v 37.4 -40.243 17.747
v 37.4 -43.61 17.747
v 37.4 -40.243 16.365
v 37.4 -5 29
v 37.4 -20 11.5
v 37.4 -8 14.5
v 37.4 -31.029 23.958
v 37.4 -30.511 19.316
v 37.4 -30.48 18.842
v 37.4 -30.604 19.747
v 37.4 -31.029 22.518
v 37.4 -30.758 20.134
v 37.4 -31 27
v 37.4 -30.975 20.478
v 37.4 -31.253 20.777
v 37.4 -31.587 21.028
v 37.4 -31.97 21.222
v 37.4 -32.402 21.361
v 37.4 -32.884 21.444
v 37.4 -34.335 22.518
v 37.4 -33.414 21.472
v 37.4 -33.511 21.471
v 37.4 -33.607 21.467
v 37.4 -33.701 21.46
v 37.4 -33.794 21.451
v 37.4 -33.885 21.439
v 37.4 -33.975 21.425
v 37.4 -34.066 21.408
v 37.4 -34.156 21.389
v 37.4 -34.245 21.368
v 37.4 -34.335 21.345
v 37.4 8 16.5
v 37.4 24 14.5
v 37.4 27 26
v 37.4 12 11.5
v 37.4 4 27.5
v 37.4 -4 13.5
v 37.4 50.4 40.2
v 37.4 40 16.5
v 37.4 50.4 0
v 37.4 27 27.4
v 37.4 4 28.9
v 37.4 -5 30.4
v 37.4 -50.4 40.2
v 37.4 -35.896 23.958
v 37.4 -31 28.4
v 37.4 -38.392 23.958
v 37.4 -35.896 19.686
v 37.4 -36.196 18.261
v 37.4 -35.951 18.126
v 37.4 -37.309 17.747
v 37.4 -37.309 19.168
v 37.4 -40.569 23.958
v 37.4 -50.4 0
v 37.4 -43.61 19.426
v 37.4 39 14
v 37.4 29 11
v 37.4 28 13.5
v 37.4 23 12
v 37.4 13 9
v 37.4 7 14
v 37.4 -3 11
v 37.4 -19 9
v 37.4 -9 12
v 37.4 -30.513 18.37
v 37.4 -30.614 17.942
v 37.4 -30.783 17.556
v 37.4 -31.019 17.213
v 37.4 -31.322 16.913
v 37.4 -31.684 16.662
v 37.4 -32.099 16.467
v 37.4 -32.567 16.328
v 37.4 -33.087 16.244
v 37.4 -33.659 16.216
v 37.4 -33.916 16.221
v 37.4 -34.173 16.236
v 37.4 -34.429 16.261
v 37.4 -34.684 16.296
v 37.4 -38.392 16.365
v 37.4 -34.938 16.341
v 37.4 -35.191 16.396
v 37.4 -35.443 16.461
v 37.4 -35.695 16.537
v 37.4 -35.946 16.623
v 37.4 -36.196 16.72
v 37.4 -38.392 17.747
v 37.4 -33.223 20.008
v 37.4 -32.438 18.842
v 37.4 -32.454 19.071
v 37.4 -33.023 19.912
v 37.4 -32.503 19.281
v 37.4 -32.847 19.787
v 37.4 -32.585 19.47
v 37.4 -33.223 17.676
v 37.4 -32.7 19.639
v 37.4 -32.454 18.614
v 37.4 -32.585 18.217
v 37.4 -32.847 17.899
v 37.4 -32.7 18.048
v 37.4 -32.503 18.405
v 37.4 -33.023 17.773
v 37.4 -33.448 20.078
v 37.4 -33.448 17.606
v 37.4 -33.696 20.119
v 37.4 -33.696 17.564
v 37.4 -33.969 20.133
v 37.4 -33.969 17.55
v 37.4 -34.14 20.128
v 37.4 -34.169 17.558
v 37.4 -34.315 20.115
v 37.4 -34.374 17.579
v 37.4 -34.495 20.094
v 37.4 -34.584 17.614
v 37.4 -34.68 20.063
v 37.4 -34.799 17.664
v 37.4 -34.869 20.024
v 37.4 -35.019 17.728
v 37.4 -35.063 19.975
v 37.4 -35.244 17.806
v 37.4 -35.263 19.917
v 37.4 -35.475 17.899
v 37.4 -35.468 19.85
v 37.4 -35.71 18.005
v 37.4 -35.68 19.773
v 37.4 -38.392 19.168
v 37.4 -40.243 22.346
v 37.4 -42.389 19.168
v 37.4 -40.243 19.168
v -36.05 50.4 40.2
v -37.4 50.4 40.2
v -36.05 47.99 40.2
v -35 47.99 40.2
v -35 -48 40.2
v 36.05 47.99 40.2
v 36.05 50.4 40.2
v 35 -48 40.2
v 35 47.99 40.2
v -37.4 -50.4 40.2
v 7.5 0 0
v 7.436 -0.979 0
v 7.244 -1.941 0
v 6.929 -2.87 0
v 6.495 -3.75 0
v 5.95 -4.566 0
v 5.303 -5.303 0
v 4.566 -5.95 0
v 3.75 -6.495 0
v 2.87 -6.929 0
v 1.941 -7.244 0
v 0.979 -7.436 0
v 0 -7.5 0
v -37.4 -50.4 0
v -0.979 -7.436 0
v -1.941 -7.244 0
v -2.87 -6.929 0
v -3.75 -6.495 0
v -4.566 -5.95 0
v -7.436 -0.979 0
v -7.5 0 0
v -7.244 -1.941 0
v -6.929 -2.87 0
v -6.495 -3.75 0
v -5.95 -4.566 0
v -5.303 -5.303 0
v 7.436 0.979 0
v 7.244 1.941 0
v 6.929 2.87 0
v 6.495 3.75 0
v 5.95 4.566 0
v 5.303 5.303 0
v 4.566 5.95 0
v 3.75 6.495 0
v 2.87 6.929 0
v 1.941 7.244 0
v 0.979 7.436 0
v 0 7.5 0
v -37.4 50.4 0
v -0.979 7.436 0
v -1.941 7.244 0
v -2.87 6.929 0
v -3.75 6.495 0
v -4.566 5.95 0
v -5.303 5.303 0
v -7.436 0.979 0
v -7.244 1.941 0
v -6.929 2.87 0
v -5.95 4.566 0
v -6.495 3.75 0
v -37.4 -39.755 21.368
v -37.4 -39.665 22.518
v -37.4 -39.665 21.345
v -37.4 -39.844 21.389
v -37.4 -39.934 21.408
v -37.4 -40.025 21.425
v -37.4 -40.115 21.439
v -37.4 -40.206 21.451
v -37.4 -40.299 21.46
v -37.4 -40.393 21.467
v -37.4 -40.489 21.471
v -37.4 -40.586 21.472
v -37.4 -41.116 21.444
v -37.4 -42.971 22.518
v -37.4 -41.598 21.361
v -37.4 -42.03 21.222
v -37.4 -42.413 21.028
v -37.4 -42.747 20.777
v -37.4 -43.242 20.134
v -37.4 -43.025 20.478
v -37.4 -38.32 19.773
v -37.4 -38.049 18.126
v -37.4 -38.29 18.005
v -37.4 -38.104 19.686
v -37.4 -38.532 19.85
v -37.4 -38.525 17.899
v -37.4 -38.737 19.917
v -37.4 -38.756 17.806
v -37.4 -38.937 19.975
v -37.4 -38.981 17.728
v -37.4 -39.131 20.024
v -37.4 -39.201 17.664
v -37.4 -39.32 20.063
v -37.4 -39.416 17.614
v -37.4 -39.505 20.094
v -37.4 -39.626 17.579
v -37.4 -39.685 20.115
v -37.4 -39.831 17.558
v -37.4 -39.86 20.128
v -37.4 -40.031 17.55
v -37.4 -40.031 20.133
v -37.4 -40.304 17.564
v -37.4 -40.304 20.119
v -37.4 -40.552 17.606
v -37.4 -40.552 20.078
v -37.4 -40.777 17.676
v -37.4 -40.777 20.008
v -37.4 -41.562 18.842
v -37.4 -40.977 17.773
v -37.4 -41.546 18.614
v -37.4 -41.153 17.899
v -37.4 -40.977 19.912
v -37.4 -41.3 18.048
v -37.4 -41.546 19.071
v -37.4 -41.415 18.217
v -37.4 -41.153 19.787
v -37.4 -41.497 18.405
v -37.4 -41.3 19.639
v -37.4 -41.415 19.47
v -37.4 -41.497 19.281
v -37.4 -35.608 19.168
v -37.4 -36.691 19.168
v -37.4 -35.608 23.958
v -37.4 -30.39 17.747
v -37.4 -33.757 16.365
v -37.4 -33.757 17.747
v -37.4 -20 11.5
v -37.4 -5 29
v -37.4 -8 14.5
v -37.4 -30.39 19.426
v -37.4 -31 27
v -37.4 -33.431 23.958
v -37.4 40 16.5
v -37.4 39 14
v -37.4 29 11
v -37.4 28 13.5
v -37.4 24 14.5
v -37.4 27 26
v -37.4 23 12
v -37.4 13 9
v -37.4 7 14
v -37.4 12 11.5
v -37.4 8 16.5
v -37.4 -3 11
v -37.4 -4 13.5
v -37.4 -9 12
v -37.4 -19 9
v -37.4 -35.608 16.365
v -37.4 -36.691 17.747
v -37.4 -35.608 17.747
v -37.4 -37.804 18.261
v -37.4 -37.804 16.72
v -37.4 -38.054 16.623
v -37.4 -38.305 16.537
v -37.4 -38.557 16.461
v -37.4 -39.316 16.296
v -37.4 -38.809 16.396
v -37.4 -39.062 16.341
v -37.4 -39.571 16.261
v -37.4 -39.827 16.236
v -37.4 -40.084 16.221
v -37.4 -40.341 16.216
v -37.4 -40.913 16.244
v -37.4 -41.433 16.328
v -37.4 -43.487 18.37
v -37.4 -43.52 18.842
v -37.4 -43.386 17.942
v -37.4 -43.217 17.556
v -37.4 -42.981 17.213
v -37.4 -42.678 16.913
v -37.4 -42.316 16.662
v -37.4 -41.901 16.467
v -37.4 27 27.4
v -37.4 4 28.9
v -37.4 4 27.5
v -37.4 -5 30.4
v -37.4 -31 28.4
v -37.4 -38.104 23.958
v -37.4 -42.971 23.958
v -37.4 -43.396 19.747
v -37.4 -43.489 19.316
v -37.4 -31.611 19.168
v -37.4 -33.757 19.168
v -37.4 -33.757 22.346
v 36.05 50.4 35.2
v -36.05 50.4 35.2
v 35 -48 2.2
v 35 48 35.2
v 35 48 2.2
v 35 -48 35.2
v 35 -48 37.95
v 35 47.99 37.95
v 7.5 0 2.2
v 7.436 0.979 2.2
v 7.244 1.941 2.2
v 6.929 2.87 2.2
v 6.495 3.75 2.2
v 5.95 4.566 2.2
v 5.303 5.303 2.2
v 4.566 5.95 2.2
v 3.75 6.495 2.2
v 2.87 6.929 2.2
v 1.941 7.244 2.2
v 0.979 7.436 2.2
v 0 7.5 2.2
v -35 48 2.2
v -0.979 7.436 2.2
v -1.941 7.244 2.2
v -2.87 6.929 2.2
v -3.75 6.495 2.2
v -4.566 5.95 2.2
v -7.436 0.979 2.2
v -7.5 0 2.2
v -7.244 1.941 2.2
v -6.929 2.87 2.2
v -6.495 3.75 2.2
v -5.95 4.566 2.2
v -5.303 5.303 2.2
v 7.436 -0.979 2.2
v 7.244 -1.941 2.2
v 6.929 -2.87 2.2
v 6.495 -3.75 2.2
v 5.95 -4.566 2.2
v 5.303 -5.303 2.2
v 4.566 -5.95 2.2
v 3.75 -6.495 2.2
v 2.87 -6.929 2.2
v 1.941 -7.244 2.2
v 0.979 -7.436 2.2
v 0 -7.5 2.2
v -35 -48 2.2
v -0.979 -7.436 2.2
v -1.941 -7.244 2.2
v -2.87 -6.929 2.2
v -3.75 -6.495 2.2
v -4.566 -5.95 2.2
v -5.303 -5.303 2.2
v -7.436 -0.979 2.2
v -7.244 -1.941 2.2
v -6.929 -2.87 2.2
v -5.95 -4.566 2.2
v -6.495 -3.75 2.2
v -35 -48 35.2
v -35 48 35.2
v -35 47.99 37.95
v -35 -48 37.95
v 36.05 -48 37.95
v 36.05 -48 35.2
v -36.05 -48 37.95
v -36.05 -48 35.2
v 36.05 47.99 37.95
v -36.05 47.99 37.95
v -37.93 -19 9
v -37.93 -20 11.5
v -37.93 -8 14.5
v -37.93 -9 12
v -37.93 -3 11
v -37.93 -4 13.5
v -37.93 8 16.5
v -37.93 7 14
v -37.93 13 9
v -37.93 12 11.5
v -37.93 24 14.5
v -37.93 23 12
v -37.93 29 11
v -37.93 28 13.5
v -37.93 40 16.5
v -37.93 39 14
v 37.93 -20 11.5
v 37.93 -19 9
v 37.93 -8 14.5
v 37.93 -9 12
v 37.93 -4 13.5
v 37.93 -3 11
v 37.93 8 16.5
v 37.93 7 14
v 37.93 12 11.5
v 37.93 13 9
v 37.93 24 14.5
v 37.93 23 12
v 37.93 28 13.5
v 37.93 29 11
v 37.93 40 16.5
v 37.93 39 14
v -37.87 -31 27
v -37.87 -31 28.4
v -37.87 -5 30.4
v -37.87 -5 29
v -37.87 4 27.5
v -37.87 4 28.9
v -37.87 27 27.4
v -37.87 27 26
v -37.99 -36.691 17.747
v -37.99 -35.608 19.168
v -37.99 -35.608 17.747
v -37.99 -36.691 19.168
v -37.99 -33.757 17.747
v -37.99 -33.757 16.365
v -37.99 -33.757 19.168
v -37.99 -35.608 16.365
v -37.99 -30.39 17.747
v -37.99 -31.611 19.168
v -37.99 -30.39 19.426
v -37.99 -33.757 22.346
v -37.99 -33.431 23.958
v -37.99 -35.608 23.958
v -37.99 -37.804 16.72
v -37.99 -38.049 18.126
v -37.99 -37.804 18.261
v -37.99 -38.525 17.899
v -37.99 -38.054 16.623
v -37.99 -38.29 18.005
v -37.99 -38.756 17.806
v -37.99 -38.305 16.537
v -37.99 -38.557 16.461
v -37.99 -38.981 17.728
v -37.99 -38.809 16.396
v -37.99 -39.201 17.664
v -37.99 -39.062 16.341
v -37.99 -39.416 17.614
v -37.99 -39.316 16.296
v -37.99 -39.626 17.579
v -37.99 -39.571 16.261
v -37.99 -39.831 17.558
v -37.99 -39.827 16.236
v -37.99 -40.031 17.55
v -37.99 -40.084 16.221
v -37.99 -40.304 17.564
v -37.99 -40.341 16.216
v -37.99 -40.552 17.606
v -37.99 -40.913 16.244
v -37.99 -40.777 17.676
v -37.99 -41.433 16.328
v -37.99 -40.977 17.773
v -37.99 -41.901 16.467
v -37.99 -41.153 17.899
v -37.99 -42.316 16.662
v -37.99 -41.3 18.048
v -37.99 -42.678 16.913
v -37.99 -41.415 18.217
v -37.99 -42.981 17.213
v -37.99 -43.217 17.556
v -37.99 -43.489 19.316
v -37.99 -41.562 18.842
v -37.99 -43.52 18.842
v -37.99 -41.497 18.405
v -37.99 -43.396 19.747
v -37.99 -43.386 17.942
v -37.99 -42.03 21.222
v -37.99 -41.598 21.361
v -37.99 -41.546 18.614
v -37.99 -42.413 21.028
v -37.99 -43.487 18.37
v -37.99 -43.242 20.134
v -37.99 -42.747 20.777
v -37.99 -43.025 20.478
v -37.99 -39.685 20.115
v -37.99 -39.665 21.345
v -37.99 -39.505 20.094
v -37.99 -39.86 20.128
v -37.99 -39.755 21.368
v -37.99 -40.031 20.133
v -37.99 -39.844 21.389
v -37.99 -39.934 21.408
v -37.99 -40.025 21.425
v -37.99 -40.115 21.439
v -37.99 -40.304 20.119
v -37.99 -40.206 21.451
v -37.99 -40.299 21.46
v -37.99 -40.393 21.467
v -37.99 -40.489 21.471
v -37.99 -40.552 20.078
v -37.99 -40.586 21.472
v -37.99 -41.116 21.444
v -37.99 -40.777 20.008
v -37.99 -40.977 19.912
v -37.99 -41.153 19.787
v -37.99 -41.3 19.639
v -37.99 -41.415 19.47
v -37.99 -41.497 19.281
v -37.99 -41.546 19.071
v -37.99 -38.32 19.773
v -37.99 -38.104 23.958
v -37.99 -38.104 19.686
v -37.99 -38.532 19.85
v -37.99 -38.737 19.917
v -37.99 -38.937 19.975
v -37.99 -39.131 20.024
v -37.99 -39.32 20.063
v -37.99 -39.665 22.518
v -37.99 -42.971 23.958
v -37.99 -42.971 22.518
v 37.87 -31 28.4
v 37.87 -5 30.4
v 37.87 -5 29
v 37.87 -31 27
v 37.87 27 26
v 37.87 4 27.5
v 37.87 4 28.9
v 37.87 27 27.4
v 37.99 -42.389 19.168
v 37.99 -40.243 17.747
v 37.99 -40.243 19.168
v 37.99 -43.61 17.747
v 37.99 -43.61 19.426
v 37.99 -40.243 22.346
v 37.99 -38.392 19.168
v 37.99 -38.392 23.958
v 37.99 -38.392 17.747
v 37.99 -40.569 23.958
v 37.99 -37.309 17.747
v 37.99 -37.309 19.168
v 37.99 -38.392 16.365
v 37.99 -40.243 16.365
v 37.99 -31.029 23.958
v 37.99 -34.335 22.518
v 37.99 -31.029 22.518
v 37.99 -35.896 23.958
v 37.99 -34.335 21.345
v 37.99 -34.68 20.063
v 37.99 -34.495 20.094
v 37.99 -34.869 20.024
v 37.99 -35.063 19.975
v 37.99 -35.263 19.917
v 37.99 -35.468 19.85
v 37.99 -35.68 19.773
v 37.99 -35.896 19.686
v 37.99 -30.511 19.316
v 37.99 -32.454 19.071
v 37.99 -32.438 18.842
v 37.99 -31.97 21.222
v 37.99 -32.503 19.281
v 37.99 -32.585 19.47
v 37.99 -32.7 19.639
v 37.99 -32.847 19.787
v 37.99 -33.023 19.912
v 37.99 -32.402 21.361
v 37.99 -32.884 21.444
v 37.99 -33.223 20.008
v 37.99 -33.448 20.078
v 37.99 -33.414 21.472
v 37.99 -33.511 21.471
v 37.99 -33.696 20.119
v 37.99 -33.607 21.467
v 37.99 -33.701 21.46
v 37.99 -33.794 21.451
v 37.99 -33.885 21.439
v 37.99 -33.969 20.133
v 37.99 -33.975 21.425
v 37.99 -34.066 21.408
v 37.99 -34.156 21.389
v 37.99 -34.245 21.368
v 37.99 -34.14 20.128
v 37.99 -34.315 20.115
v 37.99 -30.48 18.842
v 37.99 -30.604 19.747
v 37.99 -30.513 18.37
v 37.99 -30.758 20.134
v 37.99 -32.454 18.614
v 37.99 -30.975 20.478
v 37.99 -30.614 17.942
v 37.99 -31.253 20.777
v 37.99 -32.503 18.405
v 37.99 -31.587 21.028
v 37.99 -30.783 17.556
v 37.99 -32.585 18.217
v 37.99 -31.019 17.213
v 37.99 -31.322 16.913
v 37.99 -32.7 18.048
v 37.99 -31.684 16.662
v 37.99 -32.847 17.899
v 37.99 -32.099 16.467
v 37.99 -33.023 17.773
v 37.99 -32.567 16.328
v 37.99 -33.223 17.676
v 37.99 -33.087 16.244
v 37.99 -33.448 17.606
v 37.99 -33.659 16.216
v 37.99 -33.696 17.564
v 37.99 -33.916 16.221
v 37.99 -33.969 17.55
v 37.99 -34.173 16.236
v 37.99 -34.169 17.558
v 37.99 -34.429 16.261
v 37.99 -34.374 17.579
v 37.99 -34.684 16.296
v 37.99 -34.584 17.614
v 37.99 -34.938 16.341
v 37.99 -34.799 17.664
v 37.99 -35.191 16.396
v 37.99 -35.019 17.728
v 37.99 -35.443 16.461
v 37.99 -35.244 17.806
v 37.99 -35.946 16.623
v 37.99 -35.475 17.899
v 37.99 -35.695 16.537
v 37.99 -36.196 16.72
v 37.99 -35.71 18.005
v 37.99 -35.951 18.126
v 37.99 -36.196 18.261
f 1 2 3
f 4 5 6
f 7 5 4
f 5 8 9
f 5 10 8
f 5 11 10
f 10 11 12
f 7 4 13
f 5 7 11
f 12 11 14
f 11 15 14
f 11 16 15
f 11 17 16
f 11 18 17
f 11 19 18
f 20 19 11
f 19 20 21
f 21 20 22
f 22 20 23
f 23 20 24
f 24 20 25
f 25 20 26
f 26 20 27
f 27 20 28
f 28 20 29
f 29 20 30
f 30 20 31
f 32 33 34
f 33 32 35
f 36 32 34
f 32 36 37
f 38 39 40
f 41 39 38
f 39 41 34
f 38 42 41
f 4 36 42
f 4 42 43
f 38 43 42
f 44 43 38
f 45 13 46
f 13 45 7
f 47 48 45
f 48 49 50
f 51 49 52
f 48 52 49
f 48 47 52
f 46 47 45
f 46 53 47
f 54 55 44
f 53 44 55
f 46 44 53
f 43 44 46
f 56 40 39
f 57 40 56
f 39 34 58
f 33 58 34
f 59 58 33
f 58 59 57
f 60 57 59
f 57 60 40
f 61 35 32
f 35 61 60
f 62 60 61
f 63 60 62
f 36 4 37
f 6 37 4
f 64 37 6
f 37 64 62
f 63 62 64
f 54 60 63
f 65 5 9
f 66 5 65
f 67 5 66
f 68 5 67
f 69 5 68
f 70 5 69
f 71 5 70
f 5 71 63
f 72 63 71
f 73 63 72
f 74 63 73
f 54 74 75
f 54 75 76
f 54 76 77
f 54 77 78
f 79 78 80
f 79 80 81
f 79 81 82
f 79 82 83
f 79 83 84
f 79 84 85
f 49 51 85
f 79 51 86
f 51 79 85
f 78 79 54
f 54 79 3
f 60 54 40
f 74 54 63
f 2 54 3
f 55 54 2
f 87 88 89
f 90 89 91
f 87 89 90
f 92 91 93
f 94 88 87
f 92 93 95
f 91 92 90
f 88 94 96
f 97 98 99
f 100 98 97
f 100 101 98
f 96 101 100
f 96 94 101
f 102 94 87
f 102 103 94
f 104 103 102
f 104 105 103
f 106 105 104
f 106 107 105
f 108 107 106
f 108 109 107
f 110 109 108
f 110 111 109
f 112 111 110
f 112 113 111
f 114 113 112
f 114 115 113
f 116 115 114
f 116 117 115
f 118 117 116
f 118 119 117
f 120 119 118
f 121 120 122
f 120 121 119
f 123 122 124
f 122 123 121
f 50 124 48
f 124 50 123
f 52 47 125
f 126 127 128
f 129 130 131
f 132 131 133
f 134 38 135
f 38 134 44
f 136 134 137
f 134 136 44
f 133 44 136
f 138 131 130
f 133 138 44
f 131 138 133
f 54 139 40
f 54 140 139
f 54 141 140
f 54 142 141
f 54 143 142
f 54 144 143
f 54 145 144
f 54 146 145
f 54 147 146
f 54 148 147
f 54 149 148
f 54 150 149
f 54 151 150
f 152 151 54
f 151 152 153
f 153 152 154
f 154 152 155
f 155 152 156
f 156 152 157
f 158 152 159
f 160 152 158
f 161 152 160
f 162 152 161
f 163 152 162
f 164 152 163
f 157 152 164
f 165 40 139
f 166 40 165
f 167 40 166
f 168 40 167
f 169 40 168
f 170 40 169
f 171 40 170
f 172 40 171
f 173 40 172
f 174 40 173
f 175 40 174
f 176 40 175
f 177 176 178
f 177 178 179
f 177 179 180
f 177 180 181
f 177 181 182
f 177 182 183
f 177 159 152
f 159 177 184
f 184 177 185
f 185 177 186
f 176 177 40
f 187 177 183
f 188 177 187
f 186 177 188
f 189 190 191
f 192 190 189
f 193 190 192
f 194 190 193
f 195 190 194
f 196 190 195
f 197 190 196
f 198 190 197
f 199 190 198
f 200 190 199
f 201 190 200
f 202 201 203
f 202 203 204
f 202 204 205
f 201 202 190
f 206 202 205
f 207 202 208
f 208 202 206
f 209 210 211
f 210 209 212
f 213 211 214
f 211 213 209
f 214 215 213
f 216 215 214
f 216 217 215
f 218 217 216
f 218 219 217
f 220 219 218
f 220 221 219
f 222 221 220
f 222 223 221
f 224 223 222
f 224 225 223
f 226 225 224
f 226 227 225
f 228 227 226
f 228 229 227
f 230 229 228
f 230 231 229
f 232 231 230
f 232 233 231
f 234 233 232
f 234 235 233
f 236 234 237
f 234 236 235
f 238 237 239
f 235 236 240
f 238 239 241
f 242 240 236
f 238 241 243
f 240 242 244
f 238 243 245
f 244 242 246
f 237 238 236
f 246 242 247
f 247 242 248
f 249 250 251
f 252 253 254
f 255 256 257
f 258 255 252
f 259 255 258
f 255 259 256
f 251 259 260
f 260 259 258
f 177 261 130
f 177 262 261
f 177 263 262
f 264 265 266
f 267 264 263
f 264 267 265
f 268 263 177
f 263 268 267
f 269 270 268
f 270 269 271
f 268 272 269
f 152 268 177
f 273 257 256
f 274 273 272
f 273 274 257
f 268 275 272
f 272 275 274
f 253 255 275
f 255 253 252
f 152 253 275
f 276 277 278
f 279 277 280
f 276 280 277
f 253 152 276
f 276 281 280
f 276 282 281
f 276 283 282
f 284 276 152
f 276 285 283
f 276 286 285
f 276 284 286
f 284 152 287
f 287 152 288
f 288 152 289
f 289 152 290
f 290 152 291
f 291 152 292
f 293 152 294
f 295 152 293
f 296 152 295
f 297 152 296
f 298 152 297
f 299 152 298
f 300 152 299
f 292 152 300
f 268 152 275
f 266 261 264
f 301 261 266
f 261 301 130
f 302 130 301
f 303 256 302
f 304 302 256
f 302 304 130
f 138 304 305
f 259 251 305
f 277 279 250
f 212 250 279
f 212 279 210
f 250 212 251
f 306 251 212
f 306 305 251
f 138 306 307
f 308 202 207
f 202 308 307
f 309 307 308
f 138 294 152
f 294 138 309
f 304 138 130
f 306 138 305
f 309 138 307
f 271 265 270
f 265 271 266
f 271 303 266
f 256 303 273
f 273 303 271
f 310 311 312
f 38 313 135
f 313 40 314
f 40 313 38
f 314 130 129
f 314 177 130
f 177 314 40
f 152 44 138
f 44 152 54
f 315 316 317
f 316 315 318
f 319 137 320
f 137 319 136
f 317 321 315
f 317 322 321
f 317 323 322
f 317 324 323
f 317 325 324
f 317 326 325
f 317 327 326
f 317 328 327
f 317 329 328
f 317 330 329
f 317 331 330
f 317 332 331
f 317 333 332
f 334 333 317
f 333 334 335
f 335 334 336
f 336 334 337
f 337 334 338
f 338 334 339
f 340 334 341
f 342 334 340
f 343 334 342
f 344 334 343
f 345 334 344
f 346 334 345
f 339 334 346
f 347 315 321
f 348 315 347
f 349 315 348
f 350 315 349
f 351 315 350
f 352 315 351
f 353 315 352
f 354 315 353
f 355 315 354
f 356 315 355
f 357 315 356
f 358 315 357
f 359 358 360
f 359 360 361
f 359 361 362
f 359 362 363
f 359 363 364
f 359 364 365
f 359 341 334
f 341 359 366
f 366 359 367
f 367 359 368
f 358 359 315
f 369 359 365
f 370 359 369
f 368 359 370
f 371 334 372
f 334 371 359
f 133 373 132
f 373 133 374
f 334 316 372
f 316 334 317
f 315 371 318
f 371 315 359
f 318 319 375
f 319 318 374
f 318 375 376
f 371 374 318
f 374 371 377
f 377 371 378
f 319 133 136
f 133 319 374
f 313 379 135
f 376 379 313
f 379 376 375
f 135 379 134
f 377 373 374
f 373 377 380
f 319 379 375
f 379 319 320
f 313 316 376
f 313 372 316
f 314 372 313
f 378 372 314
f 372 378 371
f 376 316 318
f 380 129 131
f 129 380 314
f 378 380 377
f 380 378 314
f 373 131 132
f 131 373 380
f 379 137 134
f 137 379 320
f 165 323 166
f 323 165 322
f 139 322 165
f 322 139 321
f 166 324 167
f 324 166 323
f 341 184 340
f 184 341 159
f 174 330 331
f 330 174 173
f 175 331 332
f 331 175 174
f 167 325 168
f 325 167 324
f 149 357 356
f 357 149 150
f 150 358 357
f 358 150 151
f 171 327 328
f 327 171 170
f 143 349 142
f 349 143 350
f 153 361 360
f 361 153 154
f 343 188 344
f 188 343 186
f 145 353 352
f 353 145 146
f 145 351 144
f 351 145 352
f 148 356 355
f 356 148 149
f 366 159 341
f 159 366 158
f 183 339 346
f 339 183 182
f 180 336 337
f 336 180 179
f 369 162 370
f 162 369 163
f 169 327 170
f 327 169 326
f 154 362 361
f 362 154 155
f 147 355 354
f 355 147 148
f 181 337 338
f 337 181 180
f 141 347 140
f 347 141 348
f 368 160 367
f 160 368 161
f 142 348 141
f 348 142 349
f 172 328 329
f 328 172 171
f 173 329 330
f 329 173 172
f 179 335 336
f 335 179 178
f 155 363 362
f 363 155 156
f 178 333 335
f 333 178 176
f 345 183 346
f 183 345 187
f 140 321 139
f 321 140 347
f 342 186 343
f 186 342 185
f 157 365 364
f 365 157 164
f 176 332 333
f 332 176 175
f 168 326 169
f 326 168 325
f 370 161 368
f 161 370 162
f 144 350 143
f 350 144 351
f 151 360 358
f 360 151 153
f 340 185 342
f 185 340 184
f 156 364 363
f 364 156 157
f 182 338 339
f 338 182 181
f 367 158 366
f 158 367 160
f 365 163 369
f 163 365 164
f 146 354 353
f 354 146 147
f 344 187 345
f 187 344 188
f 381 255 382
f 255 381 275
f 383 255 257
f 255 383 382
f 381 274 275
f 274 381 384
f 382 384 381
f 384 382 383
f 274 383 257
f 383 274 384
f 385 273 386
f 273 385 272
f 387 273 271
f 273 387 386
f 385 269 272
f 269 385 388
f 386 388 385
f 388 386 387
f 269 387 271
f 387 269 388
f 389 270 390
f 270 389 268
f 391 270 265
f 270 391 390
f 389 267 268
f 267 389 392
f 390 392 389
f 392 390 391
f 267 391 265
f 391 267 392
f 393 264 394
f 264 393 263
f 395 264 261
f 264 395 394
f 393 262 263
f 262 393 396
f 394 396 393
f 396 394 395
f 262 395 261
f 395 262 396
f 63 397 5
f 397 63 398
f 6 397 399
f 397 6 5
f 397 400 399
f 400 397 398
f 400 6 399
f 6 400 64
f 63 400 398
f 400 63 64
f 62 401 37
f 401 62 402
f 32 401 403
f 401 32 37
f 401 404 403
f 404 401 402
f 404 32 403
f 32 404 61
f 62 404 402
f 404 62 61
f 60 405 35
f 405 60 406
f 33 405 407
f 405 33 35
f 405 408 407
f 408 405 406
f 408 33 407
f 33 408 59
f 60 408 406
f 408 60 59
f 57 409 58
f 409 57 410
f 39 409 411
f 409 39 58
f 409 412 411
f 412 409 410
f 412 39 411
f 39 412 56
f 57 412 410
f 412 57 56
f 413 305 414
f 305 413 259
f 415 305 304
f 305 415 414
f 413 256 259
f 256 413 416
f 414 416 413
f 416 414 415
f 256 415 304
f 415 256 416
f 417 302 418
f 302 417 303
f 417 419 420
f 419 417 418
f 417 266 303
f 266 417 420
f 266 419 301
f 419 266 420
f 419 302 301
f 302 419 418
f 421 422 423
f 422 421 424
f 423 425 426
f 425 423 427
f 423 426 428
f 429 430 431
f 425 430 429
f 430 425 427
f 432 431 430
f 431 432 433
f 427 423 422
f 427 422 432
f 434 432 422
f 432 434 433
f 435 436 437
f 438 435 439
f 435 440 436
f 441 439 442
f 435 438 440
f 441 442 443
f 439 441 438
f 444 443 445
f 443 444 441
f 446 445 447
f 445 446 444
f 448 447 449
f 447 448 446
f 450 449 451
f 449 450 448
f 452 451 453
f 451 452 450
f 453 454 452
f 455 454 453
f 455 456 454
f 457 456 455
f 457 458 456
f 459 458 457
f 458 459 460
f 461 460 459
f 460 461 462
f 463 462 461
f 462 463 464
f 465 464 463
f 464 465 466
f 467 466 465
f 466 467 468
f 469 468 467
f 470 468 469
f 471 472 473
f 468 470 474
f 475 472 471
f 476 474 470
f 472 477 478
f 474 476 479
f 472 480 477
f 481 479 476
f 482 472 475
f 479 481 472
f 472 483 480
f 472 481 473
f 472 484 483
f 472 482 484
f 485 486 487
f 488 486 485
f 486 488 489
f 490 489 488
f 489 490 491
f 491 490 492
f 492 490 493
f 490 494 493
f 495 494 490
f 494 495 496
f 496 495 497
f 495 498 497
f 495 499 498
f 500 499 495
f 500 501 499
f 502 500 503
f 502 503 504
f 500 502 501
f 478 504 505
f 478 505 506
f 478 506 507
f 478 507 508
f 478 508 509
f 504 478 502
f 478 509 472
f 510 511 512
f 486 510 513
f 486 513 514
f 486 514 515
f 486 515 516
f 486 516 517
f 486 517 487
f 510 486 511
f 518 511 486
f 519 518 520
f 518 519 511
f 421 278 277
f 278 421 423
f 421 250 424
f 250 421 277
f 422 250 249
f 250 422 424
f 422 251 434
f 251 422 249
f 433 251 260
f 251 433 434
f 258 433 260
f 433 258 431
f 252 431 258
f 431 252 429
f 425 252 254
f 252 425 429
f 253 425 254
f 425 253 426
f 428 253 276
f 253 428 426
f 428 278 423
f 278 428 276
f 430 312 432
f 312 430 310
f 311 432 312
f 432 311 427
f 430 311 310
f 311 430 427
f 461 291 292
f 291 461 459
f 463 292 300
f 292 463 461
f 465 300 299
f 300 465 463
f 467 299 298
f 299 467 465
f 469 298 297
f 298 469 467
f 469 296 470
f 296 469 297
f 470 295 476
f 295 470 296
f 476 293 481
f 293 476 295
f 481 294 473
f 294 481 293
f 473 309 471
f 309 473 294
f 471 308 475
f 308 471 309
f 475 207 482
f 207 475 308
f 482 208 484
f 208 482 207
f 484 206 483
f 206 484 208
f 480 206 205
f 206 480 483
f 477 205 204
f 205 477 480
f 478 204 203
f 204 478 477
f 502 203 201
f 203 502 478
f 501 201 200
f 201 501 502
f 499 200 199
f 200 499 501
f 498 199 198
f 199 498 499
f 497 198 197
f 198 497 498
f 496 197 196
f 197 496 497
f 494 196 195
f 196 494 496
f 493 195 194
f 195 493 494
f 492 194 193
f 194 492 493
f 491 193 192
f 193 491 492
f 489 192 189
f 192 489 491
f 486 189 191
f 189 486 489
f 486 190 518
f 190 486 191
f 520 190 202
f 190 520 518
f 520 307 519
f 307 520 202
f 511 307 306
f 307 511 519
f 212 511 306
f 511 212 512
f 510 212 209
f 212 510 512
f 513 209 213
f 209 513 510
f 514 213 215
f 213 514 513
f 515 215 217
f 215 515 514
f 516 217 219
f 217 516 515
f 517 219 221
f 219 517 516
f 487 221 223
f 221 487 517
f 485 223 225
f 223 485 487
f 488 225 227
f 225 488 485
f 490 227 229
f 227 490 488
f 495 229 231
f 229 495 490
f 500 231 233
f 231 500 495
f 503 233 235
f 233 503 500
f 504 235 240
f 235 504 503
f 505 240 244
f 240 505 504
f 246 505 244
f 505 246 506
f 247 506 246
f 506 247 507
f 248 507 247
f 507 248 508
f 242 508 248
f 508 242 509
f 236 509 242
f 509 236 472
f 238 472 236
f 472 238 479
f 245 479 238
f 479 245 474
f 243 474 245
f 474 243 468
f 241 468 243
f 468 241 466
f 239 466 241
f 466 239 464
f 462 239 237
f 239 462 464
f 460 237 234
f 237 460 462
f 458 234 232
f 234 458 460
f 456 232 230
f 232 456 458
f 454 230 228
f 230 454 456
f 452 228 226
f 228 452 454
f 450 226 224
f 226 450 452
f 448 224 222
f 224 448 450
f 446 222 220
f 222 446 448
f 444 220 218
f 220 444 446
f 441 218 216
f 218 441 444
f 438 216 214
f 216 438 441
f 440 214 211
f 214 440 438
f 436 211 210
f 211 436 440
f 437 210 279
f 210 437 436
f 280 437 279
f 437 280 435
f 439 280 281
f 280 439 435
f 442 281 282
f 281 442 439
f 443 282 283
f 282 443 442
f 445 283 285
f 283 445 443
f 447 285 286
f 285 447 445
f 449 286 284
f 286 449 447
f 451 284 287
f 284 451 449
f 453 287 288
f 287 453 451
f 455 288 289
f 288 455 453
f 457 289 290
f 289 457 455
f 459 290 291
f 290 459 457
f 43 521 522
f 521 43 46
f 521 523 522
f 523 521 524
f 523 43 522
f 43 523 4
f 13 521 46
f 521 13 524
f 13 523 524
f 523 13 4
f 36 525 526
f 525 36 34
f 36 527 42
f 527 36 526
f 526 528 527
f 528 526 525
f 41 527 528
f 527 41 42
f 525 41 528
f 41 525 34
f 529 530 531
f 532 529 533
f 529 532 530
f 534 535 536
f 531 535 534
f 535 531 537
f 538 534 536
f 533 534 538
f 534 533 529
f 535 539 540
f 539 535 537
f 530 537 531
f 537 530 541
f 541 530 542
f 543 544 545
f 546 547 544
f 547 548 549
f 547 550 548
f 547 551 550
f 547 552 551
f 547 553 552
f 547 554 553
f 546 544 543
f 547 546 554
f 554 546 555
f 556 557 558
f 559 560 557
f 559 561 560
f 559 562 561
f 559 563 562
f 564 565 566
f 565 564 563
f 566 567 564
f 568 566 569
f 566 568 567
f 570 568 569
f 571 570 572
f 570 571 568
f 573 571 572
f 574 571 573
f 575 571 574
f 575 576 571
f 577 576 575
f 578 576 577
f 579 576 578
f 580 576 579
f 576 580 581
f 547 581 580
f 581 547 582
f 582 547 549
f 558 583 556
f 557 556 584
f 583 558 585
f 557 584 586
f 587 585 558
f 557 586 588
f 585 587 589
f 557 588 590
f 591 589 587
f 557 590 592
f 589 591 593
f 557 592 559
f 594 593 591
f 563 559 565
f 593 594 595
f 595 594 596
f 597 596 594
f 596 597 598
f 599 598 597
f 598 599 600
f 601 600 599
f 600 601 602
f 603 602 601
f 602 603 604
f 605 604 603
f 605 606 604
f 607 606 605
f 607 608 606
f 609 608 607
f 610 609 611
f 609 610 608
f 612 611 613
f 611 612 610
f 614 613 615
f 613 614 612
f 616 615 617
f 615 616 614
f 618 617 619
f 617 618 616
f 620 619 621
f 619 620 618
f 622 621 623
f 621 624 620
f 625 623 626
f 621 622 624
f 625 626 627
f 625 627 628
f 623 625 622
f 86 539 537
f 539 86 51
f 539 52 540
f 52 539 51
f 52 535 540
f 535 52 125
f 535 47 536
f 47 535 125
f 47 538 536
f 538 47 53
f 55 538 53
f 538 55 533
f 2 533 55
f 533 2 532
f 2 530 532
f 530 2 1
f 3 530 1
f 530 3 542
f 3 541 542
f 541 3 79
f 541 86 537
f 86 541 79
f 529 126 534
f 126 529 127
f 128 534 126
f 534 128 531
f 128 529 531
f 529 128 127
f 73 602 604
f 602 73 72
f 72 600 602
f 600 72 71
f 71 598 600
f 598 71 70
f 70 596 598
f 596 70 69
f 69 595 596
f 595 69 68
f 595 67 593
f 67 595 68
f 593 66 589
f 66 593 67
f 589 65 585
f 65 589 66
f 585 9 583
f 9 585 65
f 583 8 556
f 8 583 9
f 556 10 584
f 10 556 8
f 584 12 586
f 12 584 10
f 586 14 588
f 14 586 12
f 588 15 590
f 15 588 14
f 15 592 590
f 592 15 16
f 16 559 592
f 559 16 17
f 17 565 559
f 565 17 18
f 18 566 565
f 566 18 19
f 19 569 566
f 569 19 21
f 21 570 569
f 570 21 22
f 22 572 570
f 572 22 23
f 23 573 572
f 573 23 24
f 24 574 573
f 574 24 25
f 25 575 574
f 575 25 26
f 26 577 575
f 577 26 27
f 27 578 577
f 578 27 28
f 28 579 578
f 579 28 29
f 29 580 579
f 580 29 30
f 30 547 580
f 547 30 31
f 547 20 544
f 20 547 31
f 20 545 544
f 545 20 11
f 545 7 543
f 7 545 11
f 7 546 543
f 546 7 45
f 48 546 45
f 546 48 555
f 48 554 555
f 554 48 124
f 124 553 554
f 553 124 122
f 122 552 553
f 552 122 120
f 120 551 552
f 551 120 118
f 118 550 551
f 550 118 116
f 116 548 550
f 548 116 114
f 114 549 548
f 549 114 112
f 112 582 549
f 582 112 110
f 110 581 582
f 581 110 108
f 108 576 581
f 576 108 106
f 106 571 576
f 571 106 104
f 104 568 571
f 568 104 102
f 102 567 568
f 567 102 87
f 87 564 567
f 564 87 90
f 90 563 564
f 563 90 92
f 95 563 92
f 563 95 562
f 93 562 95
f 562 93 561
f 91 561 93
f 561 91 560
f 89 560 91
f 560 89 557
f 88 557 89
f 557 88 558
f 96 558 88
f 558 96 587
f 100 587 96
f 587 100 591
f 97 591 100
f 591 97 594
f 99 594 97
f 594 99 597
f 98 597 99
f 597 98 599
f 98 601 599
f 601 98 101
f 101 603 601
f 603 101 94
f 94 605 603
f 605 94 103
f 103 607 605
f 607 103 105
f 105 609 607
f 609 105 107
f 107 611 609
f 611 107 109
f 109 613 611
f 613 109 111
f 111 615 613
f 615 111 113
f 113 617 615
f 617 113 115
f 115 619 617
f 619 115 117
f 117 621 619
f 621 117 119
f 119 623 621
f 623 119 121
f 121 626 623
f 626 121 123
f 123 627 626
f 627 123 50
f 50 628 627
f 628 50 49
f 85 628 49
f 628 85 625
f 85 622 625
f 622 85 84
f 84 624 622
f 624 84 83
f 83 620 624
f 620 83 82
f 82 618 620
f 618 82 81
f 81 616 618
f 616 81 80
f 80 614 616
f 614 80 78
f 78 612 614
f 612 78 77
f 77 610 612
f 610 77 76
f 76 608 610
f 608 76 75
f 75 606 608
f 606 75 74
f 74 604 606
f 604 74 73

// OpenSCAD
// Flat-format Mood Swings-inspired print prototype for one 45-card sleeved deck.
// Separate body and lid, exported base/flat face down on the build plate.
// Measured card stack cavity: 70 x 96 x 33 mm.
part = "body";
card_w = 70;
card_h = 96;
stack = 33;
wall = 2.4;
floor = 2.2;
W = card_w + 2*wall;
L = card_h + 2*wall;
channel = 1.05;
slide_clearance = 0.35;
lid_t = 2.25;
H = floor + stack + 5;
$fn = 32;

module side_mark(side, points, depth=0.58) {
  translate([side*(W/2-0.05),0,0]) rotate([0,side*90,0])
    linear_extrude(height=depth)
      polygon([for (p=points) [-side*p[1],p[0]]]);
}
module side_art() {
  for (side=[-1,1]) {
    // Broken, uneven ribbon pieces on the visible long sides.
    for (i=[0:3])
      let(y=-19+i*16, z=9+(i%2)*2)
        side_mark(side,[[y,z],[y+10,z+3],[y+11,z+5.5],[y-1,z+2.5]]);
    side_mark(side,[[-31,27],[-5,29],[-5,30.4],[-31,28.4]],0.52);
    side_mark(side,[[4,27.5],[27,26],[27,27.4],[4,28.9]],0.52);
    translate([side*(W/2-0.05),-37,20])
      rotate([0,side*90,0]) rotate([0,0,side*90])
        linear_extrude(height=0.64)
          text("45",size=7.5,font="DejaVu Sans:style=Bold",
               halign="center",valign="center");
  }
}

module body() {
  union() {
  difference() {
    translate([-W/2,-L/2,0]) cube([W,L,H]);
    translate([-card_w/2,-card_h/2,floor])
      cube([card_w,card_h,H+0.3]);
    // The enlarged slot leaves 2.25 mm roof rails and 0.25 mm vertical
    // clearance above/below a 2.25 mm lid. Each side supports 1.35 mm.
    translate([-card_w/2-channel,-card_h/2,H-5])
      cube([card_w+2*channel,card_h+wall+1,2.75]);
    // The end opening lets the lid slide in; the other end stays closed.
    translate([-card_w/2-channel,card_h/2-0.01,H-5])
      cube([card_w+2*channel,wall+1,5.3]);
    // Push the deck out with a fingertip after sliding the lid away.
    translate([0,0,-0.2]) cylinder(h=floor+0.4,d=15,$fn=48);
  }
  side_art();
  }
}

module lid_relief(points, depth=0.56) {
  translate([0,0,lid_t-0.05])
    linear_extrude(height=depth) polygon(points);
}
module lid_ink(depth=0.56) {
  translate([0,0,lid_t-0.05])
    linear_extrude(height=depth) children();
}
module lid_title(label, size, x, y, tilt=0) {
  translate([x,y,lid_t+0.60]) rotate([0,0,tilt])
    linear_extrude(height=0.75)
      text(label,size=size,font="DejaVu Sans:style=Bold",
           halign="center",valign="center");
}
module broken_arc(cx,cy,r1,r2,start,finish) {
  lid_relief(concat(
    [for (j=[0:7]) let(a=start+(finish-start)*j/7)
       [cx+r2*cos(a),cy+r2*sin(a)]],
    [for (j=[7:-1:0]) let(a=start+(finish-start)*j/7)
       [cx+r1*cos(a),cy+r1*sin(a)]]),0.60);
}
module lid_art() {
  // Raised, imperfect paper strips echo the game's hand-cut collage feeling.
  lid_relief([[-27,20],[24,22],[26,39],[-24,38]],0.38);
  lid_relief([[-26,21],[-7,21.4],[2,22.2],[23,22],[25,38],[-25,37]],0.78);
  lid_relief([[-24,-1],[28,0],[26,17],[-26,16]],0.38);
  lid_relief([[-23,0],[-3,-0.3],[8,0.7],[27,1],[25,16],[-25,15]],0.78);
  lid_title("MOOD",12,-1,30,2);
  lid_title("SWINGS",10.5,0,8,-2);

  // Five irregular mood-wheel segments orbit a generic five-pip die.
  for (i=[0:4]) broken_arc(0,-24,15.2,17.1,
                          9+i*72+(i%2)*3,60+i*72-(i%3)*2);
  lid_ink(0.70) translate([0,-24]) rotate(10)
    difference() {
      square([15.5,15.5],center=true);
      square([12.5,12.5],center=true);
    }
  lid_ink(0.70) translate([0,-24]) rotate(10)
    for (p=[[-4,-4],[-4,4],[0,0],[4,-4],[4,4]])
      translate(p) circle(d=2,$fn=16);

  // Faceted corner hatching and broken side rules.
  for (side=[-1,1]) {
    for (i=[0:3]) {
      lid_relief([[side*30,-41+i*4],
                  [side*32,-40+i*4],
                  [side*30,-36+i*4],
                  [side*28,-37+i*4]],0.56);
    }
    lid_relief([[side*30,19],[side*31,19],[side*31,39],[side*30,39]],0.52);
  }
  lid_relief([[-28,42],[-14,42.8],[-14,44],[-28,43.2]],0.56);
  lid_relief([[13,41.7],[29,42.4],[29,43.6],[13,42.9]],0.56);
}
module lid() {
  lid_w = card_w+2*channel-2*slide_clearance;
  lid_l = card_h+wall+0.4;
  union() {
    // Rail edges and underside stay smooth for the sliding fit.
    translate([-lid_w/2,-card_h/2+slide_clearance,0])
      cube([lid_w,lid_l,lid_t]);
    translate([-W/2,card_h/2+wall+0.1,0])
      cube([W,3,5]);
    lid_art();
    // Raised grip bars on the external stop for thumb access.
    for (x=[-12,-4,4,12])
      translate([x-1,card_h/2+wall+0.65,4.95])
        cube([2,1.5,0.55]);
  }
}
module fit_gauge() {
  // First coupon reproduces the actual mouth, rails, and open end. The
  // 20 mm insertion segment is enough to test the 0.35 mm side clearance.
  translate([-50,-35,-(H-10)])
    intersection() {
      body();
      translate([-W/2-1,31,H-10]) cube([W+2,23,10.1]);
    }
  // Mating front of the lid, including the external finger stop.
  translate([50,-35,0])
    intersection() {
      lid();
      translate([-W/2-1,31,-0.1]) cube([W+2,23,5.8]);
    }
  // A full-width 70 x 33 mm hole checks one 45-card stack edge-on.
  // The 92 mm card length extends out of this cheap, low ring.
  translate([0,65,0])
    difference() {
      translate([-W/2,-(stack+2*wall)/2,0])
        cube([W,stack+2*wall,6]);
      translate([-card_w/2,-stack/2,-0.2])
        cube([card_w,stack,6.4]);
    }
}
if (part=="body") body();
else if (part=="lid") lid();
else if (part=="fit_gauge") fit_gauge();
else assert(false,"part must be body, lid or fit_gauge");
